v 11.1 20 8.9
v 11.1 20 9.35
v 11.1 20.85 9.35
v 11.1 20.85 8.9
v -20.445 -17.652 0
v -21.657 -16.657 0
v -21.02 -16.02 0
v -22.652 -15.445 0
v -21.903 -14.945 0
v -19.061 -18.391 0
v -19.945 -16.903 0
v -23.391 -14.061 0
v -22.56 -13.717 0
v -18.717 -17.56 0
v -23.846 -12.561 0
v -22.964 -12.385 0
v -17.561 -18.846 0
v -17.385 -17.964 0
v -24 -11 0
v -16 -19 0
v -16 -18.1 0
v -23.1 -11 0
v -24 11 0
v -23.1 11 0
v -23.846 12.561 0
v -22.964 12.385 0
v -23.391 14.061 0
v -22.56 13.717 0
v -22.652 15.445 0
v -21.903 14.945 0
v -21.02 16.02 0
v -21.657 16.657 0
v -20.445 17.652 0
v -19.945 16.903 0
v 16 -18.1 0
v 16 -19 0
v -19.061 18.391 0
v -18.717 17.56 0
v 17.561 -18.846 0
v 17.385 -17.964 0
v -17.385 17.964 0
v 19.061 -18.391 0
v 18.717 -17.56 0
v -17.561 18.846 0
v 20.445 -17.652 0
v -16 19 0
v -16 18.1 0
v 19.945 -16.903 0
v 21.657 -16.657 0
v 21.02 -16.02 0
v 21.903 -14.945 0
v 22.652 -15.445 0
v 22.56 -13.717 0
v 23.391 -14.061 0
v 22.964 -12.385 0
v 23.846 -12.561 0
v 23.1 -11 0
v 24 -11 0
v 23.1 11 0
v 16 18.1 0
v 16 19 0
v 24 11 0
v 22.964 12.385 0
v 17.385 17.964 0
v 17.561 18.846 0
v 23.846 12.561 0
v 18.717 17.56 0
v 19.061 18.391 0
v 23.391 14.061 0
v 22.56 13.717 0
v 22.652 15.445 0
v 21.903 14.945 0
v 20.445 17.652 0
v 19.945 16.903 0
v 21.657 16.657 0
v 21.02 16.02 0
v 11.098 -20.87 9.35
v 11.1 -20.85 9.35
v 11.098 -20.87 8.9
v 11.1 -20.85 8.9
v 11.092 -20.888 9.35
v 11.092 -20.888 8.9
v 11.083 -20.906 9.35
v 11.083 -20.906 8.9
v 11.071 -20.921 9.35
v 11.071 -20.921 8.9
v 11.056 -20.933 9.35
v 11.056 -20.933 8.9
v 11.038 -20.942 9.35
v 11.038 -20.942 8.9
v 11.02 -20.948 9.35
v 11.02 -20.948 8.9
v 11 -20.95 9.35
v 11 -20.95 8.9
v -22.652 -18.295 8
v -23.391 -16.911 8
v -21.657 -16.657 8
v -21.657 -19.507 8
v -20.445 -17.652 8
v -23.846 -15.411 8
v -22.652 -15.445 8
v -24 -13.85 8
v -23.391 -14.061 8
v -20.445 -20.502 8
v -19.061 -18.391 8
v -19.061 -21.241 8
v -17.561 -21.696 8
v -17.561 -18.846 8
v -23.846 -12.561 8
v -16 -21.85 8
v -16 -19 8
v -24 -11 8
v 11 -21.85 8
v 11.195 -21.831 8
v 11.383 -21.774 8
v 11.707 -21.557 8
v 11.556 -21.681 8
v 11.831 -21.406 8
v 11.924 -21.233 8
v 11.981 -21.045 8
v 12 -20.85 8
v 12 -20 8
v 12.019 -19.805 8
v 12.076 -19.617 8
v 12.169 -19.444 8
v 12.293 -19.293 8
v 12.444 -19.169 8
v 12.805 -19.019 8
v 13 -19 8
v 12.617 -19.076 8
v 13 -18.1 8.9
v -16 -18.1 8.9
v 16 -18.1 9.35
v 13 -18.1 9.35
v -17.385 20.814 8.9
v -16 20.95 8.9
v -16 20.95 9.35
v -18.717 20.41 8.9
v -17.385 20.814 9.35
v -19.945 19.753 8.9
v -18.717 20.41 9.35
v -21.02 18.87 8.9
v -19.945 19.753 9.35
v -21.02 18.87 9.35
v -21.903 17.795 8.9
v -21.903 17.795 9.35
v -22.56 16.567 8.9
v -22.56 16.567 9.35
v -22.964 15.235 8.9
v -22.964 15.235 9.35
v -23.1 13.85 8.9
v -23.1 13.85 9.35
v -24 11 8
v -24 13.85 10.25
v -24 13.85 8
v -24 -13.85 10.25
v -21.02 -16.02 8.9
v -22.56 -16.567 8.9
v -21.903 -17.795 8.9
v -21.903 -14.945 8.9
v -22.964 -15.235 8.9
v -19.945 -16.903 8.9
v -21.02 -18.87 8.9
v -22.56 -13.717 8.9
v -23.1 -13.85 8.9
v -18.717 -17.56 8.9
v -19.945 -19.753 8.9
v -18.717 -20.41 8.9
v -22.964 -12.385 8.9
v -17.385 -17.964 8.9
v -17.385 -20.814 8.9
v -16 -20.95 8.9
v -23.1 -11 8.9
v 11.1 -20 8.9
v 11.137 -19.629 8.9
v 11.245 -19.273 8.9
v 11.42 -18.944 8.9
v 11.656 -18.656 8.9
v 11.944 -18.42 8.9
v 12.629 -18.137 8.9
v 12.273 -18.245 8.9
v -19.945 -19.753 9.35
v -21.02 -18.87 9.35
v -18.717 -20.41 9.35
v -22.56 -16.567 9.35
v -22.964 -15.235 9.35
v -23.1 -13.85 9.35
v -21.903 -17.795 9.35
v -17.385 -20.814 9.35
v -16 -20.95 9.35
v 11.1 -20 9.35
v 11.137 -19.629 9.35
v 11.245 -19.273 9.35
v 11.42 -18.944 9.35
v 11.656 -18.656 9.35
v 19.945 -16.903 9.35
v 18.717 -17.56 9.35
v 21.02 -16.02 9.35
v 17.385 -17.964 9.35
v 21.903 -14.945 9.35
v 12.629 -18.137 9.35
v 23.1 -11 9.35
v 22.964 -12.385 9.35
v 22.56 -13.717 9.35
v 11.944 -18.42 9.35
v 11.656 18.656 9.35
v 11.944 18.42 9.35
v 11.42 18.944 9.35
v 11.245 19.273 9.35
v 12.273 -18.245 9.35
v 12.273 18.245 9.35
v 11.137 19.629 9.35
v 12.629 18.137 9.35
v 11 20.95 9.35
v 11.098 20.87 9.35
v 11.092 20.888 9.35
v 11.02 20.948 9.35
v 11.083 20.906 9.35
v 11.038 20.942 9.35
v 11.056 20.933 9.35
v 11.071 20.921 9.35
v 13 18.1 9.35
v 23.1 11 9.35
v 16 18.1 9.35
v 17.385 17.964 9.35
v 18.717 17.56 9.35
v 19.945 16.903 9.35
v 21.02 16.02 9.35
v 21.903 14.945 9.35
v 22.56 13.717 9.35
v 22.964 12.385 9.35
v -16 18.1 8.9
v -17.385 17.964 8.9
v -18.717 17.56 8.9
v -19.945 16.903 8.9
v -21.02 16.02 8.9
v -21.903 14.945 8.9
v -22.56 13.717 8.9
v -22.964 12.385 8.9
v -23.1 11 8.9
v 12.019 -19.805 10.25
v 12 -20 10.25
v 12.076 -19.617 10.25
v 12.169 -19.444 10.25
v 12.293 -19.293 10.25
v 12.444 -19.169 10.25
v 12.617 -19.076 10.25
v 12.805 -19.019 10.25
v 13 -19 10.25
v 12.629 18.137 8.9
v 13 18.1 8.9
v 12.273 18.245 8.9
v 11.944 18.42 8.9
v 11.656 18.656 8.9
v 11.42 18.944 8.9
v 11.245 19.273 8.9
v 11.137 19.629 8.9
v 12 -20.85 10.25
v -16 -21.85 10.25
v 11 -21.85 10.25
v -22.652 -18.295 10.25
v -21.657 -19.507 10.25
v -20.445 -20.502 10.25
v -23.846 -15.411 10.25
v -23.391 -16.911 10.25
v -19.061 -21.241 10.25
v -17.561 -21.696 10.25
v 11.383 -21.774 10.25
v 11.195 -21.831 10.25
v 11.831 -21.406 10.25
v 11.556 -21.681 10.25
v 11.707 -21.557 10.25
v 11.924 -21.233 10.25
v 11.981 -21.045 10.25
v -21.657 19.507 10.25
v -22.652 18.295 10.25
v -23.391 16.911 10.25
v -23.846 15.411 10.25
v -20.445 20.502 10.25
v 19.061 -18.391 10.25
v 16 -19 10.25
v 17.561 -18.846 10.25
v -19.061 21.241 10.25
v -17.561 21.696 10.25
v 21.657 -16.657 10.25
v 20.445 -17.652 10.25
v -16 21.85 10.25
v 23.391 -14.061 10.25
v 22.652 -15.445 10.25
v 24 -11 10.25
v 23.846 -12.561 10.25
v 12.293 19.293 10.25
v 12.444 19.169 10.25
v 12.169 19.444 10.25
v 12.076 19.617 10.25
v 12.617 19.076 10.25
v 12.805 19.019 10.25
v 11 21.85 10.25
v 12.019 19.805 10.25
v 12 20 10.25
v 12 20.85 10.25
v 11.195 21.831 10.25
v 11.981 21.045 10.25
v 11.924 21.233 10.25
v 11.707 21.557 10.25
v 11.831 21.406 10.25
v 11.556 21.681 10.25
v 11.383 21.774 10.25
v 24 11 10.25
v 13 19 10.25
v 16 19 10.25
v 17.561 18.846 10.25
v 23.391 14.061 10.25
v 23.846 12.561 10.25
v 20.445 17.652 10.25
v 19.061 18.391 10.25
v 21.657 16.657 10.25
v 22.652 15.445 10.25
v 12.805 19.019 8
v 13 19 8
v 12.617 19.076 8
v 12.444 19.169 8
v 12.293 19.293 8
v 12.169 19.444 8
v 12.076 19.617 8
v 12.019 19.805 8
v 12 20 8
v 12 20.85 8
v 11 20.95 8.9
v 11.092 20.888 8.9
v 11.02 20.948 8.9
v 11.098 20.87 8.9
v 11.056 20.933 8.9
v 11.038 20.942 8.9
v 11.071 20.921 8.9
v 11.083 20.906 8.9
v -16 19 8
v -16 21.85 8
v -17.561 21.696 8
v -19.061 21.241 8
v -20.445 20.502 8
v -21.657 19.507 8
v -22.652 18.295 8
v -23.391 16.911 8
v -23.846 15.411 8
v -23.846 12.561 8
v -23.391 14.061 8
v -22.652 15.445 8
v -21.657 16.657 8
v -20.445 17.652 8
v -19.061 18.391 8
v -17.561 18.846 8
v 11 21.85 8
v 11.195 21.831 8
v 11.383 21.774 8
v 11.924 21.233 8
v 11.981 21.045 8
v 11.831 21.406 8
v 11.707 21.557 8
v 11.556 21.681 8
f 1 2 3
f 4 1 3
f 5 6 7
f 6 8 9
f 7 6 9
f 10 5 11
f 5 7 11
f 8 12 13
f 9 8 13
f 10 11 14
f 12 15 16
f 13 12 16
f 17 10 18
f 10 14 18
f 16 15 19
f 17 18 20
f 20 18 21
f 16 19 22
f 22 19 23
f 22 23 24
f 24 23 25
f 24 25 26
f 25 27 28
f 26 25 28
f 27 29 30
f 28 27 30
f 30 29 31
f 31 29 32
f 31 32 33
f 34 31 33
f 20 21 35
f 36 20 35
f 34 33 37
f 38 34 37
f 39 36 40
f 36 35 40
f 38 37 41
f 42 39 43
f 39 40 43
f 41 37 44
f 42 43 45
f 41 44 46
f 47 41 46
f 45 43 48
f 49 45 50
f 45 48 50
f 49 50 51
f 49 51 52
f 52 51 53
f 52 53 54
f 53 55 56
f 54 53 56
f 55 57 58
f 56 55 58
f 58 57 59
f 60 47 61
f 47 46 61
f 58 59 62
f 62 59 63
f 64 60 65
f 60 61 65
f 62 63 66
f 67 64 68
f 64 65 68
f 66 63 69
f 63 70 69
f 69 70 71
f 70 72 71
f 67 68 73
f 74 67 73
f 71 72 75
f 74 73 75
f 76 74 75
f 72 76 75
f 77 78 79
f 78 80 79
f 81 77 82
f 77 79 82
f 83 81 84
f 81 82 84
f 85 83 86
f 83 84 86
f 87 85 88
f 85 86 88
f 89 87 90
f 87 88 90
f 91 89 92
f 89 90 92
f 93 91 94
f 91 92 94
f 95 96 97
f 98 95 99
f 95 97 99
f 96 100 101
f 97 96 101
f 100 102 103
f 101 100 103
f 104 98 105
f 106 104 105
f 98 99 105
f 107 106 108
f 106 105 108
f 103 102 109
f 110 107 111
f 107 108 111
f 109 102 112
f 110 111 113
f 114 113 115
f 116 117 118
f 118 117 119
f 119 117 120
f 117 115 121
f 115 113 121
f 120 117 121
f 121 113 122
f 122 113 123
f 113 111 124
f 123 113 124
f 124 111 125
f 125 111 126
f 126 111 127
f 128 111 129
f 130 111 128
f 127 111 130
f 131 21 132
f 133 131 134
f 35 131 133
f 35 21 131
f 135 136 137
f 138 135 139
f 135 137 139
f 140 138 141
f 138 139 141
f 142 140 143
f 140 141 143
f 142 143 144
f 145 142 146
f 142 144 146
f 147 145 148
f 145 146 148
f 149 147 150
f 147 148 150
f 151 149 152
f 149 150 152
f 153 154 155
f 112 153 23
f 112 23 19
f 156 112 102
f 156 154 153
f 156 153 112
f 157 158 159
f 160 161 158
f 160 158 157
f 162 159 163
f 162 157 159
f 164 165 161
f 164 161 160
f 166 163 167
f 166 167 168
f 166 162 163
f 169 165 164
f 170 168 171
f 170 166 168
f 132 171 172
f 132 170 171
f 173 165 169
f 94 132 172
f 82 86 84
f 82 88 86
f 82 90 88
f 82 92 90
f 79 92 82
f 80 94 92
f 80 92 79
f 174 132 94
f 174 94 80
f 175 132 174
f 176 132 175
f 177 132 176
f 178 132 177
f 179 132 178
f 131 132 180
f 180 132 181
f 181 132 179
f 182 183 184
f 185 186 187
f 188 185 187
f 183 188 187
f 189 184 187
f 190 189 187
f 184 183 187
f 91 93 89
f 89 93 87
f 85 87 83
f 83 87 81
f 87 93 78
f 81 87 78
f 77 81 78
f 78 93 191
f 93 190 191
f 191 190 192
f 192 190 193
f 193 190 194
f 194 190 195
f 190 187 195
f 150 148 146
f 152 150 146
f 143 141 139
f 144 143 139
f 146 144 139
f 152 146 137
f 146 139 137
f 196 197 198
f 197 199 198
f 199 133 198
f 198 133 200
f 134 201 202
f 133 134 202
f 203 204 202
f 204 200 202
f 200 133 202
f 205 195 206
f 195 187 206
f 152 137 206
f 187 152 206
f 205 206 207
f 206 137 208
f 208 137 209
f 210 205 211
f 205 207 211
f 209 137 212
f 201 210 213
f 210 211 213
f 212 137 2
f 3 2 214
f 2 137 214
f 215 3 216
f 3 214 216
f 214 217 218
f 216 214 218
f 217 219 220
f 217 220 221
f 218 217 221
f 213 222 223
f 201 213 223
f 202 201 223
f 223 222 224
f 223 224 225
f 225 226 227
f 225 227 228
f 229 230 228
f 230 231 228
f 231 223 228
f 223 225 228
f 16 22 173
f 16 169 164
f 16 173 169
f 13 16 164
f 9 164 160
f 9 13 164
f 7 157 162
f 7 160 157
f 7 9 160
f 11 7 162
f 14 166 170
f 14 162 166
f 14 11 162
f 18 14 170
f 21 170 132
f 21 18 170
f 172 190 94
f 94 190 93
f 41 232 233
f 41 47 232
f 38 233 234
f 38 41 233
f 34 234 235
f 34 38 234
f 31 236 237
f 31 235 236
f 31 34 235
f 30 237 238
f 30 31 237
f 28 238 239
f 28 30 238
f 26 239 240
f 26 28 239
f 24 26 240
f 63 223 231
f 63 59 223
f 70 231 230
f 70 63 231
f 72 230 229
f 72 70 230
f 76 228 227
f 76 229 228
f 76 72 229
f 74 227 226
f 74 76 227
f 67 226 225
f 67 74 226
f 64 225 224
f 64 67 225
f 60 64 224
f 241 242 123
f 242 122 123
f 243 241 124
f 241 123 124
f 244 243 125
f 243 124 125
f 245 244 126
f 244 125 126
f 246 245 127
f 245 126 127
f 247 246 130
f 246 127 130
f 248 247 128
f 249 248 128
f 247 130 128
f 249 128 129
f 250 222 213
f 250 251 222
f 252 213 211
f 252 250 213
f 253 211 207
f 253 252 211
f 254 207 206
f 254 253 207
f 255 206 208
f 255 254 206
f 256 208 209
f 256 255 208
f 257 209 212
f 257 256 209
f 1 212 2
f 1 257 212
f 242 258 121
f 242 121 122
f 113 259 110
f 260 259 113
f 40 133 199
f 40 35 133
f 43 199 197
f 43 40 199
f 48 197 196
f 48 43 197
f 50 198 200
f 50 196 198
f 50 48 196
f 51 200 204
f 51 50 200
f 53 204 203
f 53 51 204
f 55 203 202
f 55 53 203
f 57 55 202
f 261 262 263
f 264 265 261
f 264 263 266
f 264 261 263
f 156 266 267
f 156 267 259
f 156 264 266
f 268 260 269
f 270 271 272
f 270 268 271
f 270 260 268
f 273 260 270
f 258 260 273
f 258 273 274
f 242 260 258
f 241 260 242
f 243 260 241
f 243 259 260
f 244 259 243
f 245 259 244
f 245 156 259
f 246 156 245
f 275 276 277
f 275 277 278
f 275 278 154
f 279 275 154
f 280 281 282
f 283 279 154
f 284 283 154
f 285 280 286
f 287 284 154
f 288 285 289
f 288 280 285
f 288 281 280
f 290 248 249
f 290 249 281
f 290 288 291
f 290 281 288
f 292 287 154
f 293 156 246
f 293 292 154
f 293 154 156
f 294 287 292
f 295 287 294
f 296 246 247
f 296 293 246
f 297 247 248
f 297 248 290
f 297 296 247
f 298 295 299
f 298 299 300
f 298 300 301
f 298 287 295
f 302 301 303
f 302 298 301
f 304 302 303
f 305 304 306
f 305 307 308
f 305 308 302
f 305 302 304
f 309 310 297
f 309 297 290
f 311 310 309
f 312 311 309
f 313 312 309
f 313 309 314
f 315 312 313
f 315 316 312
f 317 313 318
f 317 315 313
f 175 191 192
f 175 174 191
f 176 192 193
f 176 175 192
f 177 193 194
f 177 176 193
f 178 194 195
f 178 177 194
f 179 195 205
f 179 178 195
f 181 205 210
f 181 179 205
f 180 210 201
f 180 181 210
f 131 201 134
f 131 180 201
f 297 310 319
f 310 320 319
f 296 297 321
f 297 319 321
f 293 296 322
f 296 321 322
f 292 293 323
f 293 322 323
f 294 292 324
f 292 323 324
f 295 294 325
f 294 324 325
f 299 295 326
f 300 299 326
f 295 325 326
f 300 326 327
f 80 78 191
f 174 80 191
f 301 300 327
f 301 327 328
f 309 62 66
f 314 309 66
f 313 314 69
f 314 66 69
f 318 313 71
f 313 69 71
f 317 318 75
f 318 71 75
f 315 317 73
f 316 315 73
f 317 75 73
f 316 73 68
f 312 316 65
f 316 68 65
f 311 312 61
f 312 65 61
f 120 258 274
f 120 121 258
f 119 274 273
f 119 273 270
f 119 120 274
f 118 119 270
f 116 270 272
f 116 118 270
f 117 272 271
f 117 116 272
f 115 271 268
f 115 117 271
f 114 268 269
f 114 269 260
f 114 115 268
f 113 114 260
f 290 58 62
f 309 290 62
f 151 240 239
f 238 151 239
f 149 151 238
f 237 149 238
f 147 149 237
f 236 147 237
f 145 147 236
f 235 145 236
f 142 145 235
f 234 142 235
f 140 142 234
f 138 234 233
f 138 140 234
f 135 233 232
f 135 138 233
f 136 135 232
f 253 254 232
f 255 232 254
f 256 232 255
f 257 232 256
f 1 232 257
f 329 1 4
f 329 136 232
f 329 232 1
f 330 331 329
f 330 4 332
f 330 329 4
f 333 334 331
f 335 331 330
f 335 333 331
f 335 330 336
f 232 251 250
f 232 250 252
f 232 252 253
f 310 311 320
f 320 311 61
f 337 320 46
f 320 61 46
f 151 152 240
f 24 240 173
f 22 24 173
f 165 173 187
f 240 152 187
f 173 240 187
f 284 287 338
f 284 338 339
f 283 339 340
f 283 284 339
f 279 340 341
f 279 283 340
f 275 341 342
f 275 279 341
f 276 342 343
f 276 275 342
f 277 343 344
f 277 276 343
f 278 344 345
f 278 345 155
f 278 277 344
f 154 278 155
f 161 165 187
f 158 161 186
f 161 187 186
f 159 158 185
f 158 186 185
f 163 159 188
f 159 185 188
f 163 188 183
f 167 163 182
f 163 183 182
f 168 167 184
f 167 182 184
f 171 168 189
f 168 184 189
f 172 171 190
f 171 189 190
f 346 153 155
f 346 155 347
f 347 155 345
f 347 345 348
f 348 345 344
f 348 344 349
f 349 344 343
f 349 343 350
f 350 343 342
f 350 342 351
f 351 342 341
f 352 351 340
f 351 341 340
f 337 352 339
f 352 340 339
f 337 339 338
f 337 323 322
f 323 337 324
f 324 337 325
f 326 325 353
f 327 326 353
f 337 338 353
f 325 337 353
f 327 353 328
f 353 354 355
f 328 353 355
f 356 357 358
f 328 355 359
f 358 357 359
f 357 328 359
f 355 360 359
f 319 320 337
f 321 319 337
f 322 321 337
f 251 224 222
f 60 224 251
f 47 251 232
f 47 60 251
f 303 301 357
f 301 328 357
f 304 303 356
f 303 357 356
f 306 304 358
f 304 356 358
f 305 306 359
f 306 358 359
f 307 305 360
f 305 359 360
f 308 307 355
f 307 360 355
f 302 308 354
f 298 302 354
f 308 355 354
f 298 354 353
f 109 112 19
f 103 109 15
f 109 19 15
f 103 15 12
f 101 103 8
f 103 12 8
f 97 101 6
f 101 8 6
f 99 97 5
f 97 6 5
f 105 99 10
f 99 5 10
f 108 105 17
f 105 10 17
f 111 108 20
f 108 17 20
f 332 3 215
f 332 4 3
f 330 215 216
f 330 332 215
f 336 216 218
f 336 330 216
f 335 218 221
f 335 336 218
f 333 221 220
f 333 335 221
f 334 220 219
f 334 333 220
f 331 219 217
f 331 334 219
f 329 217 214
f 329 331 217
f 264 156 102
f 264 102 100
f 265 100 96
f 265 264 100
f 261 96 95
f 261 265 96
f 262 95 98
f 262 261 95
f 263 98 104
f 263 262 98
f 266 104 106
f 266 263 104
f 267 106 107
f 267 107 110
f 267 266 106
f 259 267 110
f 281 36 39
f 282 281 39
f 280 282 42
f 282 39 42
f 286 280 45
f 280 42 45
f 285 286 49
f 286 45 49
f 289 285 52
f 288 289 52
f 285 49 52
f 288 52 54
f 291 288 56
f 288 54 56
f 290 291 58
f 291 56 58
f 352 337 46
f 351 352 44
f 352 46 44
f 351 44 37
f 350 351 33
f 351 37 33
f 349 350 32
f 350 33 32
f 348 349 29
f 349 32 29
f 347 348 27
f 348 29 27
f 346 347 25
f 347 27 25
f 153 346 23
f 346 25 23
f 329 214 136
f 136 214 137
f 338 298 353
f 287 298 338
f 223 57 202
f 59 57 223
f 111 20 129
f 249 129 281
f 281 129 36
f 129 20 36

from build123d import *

# Parameters (mm, degrees)
F1_DEPTH = 10.25
F3_DEPTH = 2.25
F4_R     = 1
F5_T     = -0.9


with BuildPart() as f1:
    # F0 (on Top) → F1 (new body)
    with BuildSketch(Plane.XY):
        with BuildLine():
            Line((16, 19), (-16, 19))
            ThreePointArc((-16, 19), (-21.6568542495, 16.6568542495), (-24, 11))
            Line((-24, 11), (-24, -11))
            ThreePointArc((-24, -11), (-21.6568542495, -16.6568542495), (-16, -19))
            Line((-16, -19), (16, -19))
            ThreePointArc((16, -19), (21.6568542495, -16.6568542495), (24, -11))
            Line((24, -11), (24, 11))
            ThreePointArc((24, 11), (21.6568542495, 16.6568542495), (16, 19))
        make_face()
    extrude(amount=F1_DEPTH)

    # F2 (on face) → F3 (join)
    with BuildSketch(Plane.XY.offset(10.25)):
        with BuildLine():
            Line((12, -21.85), (12, -19))
            Line((12, -19), (-16, -19))
            ThreePointArc((-16, -19), (-21.6568542495, -16.6568542495), (-24, -11))
            Line((-24, -11), (-24, -13.85))
            ThreePointArc((-24, -13.85), (-21.6568542495, -19.5068542495), (-16, -21.85))
            Line((-16, -21.85), (12, -21.85))
        make_face()
        with BuildLine():
            Line((12, 21.85), (-16, 21.85))
            ThreePointArc((-16, 21.85), (-21.6568542495, 19.5068542495), (-24, 13.85))
            Line((-24, 13.85), (-24, 11))
            ThreePointArc((-24, 11), (-21.6568542495, 16.6568542495), (-16, 19))
            Line((-16, 19), (12, 19))
            Line((12, 19), (12, 21.85))
        make_face()
    extrude(amount=-F3_DEPTH)

    # F4
    f4_edges = [f1.edges().sort_by_distance(p)[0] for p in [
        (12, -21.85, 9.125),
        (12, 21.85, 9.125),
        (12, 19, 9.125),
        (12, -19, 9.125),
    ]]
    fillet(f4_edges, radius=F4_R)

    # F5
    f5_openings = [f1.faces().sort_by_distance(p)[0] for p in [
        (0, 0, 0),
    ]]
    offset(amount=F5_T, openings=f5_openings, kind=Kind.INTERSECTION)


solid = f1.part
